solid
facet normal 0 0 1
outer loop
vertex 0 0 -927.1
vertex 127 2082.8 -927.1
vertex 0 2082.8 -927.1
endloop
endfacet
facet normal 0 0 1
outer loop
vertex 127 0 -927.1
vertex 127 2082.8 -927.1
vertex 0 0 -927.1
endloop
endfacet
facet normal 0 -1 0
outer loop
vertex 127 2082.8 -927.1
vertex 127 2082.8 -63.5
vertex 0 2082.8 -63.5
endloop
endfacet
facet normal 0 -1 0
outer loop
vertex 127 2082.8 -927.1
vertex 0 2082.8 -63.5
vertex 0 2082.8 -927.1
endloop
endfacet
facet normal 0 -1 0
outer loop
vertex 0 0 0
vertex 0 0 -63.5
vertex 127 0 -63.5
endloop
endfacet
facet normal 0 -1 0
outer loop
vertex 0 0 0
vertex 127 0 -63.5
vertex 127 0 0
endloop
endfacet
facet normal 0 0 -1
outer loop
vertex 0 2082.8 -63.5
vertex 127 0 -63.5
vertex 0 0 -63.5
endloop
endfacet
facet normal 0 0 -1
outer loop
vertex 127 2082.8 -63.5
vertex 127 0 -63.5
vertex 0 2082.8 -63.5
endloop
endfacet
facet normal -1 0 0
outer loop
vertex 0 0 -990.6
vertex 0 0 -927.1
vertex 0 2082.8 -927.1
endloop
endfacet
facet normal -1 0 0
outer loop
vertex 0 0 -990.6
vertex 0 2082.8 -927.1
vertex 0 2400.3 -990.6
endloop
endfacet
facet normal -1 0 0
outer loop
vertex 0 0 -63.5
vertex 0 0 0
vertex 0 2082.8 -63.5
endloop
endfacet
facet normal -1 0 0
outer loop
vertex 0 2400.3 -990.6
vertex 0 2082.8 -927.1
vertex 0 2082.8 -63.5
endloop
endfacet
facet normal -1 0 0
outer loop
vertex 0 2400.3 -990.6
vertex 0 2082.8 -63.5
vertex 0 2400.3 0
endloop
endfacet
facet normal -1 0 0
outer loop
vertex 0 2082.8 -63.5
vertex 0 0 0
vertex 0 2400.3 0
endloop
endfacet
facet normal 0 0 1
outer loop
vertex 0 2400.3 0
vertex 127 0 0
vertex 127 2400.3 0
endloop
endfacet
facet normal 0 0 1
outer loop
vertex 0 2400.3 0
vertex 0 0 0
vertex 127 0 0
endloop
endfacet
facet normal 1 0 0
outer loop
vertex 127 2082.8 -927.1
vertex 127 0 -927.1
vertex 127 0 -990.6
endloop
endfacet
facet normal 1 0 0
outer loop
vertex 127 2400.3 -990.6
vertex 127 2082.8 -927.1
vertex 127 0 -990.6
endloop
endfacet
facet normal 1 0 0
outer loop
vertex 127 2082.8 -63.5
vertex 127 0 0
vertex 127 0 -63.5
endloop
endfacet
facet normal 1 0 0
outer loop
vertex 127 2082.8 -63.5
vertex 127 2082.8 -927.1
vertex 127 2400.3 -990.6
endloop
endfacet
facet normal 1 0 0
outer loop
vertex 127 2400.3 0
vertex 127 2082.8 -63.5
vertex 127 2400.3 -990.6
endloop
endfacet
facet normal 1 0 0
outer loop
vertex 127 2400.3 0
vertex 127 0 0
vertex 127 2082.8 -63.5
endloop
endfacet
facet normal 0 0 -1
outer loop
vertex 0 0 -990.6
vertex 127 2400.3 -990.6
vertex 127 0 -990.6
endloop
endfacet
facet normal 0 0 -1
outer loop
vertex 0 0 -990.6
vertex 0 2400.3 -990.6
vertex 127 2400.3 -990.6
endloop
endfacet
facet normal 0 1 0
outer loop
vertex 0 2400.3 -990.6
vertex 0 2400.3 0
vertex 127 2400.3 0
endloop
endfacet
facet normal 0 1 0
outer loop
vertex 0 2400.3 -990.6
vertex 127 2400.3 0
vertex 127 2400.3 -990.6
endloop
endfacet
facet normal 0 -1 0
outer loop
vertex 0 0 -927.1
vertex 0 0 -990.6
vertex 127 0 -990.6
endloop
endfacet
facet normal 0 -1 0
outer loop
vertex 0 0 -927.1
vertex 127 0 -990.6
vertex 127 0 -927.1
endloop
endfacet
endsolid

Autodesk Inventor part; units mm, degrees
ref_plane "YZ Plane" through (0, 0, 0) normal (1, 0, 0) x (0, 1, 0)
ref_plane "XZ Plane" through (0, 0, 0) normal (0, 1, 0) x (-1, 0, 0)
ref_plane "XY Plane" through (0, 0, 0) normal (0, 0, 1) x (1, 0, 0)
sketch "Sketch1" plane through (0, 0, 0) normal (1, 0, 0) x (0, 1, 0)
  line L0 (0, 0) -> (2400.3, 0)
  line L1 (2400.3, 0) -> (2400.3, -990.6)
  line L2 (2400.3, -990.6) -> (0, -990.6)
  line L3 (0, -990.6) -> (0, 0)
  dimension "d0" = 990.6
  dimension "d1" = 2400.3
extrude "Extrusion1" add sketch "Sketch1" along normal blind 127
sketch "Sketch2" plane through (127, 0, 0) normal (1, 0, 0) x (0, 0, -1)
  line L0 (0, 0) -> (990.6, 0) projected
  line L1 (927.1, 0) -> (63.5, 0)
  line L2 (63.5, 0) -> (63.5, 2082.8)
  line L3 (63.5, 2082.8) -> (927.1, 2082.8)
  line L4 (927.1, 2082.8) -> (927.1, 0)
  line L5 (990.6, 0) -> (990.6, 2400.3) projected
  point P0 (63.5, 0)
  point P1 (63.5, 0)
  dimension "d4" = 2082.8
  dimension "d6" = 63.5
  dimension "d7" = 863.6
extrude "Extrusion2" cut sketch "Sketch2" against normal up to surface (127 mm away)
properties part number "Wall_With_Door_For_Attic_Room" material "Wood (Southern Pine)"
